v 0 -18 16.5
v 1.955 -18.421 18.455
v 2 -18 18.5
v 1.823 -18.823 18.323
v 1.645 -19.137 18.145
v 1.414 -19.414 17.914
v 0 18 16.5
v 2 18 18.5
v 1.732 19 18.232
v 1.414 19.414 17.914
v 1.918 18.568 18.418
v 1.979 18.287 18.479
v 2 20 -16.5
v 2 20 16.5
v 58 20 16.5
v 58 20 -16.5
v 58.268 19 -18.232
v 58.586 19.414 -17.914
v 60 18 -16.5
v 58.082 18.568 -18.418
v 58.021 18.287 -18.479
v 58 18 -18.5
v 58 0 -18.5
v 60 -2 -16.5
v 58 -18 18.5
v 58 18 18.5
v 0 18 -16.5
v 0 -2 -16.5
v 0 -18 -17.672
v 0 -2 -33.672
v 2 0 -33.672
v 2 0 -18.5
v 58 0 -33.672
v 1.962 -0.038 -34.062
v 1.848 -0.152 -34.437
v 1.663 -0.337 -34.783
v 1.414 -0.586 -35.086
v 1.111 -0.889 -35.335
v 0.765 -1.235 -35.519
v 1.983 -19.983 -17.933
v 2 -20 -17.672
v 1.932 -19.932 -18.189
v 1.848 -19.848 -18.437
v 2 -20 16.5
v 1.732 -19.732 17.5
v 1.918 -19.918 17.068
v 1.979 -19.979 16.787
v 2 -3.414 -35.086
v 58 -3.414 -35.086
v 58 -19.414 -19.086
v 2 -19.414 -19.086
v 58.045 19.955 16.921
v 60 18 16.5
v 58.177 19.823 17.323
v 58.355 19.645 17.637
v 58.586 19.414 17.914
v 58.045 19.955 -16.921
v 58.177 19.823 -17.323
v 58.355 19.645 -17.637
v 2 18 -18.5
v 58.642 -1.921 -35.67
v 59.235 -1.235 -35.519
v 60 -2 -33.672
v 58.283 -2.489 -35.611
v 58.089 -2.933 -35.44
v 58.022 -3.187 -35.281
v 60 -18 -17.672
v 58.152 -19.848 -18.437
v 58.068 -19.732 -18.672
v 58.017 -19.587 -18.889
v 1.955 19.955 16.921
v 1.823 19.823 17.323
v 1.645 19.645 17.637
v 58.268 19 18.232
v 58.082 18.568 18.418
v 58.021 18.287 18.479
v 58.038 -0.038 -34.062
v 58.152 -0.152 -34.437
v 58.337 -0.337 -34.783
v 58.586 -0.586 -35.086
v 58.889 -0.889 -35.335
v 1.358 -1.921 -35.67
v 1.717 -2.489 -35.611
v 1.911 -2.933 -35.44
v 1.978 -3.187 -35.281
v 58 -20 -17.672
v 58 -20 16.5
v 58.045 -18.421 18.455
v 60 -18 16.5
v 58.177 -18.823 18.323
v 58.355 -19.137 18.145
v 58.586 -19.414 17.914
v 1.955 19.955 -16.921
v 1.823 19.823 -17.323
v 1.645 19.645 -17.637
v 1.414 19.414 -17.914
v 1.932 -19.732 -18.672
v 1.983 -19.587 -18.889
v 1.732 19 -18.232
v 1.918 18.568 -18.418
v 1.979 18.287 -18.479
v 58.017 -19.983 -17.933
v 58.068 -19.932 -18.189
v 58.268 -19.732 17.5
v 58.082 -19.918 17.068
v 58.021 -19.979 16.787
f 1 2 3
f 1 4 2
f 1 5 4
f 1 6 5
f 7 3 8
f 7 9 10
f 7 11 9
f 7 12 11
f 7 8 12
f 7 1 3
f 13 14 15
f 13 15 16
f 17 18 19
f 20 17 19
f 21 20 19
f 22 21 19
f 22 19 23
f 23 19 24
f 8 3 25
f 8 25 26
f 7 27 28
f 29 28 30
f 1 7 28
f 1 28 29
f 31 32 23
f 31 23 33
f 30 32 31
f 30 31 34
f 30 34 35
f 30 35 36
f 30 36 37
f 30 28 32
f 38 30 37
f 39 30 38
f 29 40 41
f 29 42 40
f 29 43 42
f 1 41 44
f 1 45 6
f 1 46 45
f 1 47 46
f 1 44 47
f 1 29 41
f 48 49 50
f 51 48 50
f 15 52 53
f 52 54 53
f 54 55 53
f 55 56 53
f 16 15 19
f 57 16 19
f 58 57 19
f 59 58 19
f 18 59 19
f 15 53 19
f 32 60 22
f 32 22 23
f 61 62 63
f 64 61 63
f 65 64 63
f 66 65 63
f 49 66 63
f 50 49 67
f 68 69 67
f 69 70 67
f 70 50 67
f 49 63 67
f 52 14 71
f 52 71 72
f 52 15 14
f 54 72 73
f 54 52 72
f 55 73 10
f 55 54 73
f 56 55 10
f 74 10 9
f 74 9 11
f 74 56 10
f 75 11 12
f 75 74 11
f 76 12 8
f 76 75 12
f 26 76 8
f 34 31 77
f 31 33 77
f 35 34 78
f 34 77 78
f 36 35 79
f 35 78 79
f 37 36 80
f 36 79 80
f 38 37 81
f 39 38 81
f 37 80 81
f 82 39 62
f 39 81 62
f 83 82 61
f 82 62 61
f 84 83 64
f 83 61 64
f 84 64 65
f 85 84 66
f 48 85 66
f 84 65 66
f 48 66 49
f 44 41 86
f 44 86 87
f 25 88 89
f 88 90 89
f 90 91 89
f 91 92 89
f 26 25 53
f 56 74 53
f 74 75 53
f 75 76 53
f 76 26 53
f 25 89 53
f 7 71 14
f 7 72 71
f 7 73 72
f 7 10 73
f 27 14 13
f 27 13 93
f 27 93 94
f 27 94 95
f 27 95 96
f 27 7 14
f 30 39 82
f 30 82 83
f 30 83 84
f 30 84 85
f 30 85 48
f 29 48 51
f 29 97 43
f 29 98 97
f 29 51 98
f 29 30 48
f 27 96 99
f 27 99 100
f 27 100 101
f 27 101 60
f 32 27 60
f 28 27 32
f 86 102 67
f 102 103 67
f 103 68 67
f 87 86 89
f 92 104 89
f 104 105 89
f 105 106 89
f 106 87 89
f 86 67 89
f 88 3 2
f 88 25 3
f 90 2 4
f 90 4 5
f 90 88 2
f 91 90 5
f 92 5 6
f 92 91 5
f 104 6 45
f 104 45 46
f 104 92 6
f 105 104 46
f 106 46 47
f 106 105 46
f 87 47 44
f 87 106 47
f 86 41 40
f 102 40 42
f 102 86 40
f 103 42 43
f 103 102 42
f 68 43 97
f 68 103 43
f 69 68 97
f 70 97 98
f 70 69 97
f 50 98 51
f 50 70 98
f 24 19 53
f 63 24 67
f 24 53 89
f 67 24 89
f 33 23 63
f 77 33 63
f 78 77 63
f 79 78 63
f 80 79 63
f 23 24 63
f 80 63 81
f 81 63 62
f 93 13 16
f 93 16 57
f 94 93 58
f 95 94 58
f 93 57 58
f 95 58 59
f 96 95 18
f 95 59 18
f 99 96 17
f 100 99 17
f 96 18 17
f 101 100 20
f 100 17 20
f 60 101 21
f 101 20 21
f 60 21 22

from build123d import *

# Parameters (mm, degrees)
PAD_DEPTH    = 60
CHAMFER_SIZE = 2
FILLET_R     = 2


with BuildPart() as part:
    # Sketch → Pad (new body)
    with BuildSketch(Plane.YZ):
        Polygon((20, 18.5), (20, -18.5), (0, -18.5), (0, -38.5), (-20, -18.5), (-20, 18.5), align=None)
    extrude(amount=PAD_DEPTH)

    # Chamfer
    chamfer_edges = [part.edges().sort_by_distance(p)[0] for p in [
        (0, 20, 0),
        (0, 10, -18.5),
        (0, 0, -28.5),
        (0, -10, -28.5),
        (0, -20, 0),
        (0, 0, 18.5),
        (60, 20, 0),
        (60, 10, -18.5),
        (60, 0, -28.5),
        (60, -10, -28.5),
        (60, -20, 0),
        (60, 0, 18.5),
    ]]
    chamfer(chamfer_edges, length=CHAMFER_SIZE)

    # Fillet
    fillet_edges = [part.edges().sort_by_distance(p)[0] for p in [
        (30, 0, -38.5),
        (30, 20, -18.5),
        (30, 20, 18.5),
        (30, -20, 18.5),
        (30, -20, -18.5),
    ]]
    fillet(fillet_edges, radius=FILLET_R)


solid = part.part
